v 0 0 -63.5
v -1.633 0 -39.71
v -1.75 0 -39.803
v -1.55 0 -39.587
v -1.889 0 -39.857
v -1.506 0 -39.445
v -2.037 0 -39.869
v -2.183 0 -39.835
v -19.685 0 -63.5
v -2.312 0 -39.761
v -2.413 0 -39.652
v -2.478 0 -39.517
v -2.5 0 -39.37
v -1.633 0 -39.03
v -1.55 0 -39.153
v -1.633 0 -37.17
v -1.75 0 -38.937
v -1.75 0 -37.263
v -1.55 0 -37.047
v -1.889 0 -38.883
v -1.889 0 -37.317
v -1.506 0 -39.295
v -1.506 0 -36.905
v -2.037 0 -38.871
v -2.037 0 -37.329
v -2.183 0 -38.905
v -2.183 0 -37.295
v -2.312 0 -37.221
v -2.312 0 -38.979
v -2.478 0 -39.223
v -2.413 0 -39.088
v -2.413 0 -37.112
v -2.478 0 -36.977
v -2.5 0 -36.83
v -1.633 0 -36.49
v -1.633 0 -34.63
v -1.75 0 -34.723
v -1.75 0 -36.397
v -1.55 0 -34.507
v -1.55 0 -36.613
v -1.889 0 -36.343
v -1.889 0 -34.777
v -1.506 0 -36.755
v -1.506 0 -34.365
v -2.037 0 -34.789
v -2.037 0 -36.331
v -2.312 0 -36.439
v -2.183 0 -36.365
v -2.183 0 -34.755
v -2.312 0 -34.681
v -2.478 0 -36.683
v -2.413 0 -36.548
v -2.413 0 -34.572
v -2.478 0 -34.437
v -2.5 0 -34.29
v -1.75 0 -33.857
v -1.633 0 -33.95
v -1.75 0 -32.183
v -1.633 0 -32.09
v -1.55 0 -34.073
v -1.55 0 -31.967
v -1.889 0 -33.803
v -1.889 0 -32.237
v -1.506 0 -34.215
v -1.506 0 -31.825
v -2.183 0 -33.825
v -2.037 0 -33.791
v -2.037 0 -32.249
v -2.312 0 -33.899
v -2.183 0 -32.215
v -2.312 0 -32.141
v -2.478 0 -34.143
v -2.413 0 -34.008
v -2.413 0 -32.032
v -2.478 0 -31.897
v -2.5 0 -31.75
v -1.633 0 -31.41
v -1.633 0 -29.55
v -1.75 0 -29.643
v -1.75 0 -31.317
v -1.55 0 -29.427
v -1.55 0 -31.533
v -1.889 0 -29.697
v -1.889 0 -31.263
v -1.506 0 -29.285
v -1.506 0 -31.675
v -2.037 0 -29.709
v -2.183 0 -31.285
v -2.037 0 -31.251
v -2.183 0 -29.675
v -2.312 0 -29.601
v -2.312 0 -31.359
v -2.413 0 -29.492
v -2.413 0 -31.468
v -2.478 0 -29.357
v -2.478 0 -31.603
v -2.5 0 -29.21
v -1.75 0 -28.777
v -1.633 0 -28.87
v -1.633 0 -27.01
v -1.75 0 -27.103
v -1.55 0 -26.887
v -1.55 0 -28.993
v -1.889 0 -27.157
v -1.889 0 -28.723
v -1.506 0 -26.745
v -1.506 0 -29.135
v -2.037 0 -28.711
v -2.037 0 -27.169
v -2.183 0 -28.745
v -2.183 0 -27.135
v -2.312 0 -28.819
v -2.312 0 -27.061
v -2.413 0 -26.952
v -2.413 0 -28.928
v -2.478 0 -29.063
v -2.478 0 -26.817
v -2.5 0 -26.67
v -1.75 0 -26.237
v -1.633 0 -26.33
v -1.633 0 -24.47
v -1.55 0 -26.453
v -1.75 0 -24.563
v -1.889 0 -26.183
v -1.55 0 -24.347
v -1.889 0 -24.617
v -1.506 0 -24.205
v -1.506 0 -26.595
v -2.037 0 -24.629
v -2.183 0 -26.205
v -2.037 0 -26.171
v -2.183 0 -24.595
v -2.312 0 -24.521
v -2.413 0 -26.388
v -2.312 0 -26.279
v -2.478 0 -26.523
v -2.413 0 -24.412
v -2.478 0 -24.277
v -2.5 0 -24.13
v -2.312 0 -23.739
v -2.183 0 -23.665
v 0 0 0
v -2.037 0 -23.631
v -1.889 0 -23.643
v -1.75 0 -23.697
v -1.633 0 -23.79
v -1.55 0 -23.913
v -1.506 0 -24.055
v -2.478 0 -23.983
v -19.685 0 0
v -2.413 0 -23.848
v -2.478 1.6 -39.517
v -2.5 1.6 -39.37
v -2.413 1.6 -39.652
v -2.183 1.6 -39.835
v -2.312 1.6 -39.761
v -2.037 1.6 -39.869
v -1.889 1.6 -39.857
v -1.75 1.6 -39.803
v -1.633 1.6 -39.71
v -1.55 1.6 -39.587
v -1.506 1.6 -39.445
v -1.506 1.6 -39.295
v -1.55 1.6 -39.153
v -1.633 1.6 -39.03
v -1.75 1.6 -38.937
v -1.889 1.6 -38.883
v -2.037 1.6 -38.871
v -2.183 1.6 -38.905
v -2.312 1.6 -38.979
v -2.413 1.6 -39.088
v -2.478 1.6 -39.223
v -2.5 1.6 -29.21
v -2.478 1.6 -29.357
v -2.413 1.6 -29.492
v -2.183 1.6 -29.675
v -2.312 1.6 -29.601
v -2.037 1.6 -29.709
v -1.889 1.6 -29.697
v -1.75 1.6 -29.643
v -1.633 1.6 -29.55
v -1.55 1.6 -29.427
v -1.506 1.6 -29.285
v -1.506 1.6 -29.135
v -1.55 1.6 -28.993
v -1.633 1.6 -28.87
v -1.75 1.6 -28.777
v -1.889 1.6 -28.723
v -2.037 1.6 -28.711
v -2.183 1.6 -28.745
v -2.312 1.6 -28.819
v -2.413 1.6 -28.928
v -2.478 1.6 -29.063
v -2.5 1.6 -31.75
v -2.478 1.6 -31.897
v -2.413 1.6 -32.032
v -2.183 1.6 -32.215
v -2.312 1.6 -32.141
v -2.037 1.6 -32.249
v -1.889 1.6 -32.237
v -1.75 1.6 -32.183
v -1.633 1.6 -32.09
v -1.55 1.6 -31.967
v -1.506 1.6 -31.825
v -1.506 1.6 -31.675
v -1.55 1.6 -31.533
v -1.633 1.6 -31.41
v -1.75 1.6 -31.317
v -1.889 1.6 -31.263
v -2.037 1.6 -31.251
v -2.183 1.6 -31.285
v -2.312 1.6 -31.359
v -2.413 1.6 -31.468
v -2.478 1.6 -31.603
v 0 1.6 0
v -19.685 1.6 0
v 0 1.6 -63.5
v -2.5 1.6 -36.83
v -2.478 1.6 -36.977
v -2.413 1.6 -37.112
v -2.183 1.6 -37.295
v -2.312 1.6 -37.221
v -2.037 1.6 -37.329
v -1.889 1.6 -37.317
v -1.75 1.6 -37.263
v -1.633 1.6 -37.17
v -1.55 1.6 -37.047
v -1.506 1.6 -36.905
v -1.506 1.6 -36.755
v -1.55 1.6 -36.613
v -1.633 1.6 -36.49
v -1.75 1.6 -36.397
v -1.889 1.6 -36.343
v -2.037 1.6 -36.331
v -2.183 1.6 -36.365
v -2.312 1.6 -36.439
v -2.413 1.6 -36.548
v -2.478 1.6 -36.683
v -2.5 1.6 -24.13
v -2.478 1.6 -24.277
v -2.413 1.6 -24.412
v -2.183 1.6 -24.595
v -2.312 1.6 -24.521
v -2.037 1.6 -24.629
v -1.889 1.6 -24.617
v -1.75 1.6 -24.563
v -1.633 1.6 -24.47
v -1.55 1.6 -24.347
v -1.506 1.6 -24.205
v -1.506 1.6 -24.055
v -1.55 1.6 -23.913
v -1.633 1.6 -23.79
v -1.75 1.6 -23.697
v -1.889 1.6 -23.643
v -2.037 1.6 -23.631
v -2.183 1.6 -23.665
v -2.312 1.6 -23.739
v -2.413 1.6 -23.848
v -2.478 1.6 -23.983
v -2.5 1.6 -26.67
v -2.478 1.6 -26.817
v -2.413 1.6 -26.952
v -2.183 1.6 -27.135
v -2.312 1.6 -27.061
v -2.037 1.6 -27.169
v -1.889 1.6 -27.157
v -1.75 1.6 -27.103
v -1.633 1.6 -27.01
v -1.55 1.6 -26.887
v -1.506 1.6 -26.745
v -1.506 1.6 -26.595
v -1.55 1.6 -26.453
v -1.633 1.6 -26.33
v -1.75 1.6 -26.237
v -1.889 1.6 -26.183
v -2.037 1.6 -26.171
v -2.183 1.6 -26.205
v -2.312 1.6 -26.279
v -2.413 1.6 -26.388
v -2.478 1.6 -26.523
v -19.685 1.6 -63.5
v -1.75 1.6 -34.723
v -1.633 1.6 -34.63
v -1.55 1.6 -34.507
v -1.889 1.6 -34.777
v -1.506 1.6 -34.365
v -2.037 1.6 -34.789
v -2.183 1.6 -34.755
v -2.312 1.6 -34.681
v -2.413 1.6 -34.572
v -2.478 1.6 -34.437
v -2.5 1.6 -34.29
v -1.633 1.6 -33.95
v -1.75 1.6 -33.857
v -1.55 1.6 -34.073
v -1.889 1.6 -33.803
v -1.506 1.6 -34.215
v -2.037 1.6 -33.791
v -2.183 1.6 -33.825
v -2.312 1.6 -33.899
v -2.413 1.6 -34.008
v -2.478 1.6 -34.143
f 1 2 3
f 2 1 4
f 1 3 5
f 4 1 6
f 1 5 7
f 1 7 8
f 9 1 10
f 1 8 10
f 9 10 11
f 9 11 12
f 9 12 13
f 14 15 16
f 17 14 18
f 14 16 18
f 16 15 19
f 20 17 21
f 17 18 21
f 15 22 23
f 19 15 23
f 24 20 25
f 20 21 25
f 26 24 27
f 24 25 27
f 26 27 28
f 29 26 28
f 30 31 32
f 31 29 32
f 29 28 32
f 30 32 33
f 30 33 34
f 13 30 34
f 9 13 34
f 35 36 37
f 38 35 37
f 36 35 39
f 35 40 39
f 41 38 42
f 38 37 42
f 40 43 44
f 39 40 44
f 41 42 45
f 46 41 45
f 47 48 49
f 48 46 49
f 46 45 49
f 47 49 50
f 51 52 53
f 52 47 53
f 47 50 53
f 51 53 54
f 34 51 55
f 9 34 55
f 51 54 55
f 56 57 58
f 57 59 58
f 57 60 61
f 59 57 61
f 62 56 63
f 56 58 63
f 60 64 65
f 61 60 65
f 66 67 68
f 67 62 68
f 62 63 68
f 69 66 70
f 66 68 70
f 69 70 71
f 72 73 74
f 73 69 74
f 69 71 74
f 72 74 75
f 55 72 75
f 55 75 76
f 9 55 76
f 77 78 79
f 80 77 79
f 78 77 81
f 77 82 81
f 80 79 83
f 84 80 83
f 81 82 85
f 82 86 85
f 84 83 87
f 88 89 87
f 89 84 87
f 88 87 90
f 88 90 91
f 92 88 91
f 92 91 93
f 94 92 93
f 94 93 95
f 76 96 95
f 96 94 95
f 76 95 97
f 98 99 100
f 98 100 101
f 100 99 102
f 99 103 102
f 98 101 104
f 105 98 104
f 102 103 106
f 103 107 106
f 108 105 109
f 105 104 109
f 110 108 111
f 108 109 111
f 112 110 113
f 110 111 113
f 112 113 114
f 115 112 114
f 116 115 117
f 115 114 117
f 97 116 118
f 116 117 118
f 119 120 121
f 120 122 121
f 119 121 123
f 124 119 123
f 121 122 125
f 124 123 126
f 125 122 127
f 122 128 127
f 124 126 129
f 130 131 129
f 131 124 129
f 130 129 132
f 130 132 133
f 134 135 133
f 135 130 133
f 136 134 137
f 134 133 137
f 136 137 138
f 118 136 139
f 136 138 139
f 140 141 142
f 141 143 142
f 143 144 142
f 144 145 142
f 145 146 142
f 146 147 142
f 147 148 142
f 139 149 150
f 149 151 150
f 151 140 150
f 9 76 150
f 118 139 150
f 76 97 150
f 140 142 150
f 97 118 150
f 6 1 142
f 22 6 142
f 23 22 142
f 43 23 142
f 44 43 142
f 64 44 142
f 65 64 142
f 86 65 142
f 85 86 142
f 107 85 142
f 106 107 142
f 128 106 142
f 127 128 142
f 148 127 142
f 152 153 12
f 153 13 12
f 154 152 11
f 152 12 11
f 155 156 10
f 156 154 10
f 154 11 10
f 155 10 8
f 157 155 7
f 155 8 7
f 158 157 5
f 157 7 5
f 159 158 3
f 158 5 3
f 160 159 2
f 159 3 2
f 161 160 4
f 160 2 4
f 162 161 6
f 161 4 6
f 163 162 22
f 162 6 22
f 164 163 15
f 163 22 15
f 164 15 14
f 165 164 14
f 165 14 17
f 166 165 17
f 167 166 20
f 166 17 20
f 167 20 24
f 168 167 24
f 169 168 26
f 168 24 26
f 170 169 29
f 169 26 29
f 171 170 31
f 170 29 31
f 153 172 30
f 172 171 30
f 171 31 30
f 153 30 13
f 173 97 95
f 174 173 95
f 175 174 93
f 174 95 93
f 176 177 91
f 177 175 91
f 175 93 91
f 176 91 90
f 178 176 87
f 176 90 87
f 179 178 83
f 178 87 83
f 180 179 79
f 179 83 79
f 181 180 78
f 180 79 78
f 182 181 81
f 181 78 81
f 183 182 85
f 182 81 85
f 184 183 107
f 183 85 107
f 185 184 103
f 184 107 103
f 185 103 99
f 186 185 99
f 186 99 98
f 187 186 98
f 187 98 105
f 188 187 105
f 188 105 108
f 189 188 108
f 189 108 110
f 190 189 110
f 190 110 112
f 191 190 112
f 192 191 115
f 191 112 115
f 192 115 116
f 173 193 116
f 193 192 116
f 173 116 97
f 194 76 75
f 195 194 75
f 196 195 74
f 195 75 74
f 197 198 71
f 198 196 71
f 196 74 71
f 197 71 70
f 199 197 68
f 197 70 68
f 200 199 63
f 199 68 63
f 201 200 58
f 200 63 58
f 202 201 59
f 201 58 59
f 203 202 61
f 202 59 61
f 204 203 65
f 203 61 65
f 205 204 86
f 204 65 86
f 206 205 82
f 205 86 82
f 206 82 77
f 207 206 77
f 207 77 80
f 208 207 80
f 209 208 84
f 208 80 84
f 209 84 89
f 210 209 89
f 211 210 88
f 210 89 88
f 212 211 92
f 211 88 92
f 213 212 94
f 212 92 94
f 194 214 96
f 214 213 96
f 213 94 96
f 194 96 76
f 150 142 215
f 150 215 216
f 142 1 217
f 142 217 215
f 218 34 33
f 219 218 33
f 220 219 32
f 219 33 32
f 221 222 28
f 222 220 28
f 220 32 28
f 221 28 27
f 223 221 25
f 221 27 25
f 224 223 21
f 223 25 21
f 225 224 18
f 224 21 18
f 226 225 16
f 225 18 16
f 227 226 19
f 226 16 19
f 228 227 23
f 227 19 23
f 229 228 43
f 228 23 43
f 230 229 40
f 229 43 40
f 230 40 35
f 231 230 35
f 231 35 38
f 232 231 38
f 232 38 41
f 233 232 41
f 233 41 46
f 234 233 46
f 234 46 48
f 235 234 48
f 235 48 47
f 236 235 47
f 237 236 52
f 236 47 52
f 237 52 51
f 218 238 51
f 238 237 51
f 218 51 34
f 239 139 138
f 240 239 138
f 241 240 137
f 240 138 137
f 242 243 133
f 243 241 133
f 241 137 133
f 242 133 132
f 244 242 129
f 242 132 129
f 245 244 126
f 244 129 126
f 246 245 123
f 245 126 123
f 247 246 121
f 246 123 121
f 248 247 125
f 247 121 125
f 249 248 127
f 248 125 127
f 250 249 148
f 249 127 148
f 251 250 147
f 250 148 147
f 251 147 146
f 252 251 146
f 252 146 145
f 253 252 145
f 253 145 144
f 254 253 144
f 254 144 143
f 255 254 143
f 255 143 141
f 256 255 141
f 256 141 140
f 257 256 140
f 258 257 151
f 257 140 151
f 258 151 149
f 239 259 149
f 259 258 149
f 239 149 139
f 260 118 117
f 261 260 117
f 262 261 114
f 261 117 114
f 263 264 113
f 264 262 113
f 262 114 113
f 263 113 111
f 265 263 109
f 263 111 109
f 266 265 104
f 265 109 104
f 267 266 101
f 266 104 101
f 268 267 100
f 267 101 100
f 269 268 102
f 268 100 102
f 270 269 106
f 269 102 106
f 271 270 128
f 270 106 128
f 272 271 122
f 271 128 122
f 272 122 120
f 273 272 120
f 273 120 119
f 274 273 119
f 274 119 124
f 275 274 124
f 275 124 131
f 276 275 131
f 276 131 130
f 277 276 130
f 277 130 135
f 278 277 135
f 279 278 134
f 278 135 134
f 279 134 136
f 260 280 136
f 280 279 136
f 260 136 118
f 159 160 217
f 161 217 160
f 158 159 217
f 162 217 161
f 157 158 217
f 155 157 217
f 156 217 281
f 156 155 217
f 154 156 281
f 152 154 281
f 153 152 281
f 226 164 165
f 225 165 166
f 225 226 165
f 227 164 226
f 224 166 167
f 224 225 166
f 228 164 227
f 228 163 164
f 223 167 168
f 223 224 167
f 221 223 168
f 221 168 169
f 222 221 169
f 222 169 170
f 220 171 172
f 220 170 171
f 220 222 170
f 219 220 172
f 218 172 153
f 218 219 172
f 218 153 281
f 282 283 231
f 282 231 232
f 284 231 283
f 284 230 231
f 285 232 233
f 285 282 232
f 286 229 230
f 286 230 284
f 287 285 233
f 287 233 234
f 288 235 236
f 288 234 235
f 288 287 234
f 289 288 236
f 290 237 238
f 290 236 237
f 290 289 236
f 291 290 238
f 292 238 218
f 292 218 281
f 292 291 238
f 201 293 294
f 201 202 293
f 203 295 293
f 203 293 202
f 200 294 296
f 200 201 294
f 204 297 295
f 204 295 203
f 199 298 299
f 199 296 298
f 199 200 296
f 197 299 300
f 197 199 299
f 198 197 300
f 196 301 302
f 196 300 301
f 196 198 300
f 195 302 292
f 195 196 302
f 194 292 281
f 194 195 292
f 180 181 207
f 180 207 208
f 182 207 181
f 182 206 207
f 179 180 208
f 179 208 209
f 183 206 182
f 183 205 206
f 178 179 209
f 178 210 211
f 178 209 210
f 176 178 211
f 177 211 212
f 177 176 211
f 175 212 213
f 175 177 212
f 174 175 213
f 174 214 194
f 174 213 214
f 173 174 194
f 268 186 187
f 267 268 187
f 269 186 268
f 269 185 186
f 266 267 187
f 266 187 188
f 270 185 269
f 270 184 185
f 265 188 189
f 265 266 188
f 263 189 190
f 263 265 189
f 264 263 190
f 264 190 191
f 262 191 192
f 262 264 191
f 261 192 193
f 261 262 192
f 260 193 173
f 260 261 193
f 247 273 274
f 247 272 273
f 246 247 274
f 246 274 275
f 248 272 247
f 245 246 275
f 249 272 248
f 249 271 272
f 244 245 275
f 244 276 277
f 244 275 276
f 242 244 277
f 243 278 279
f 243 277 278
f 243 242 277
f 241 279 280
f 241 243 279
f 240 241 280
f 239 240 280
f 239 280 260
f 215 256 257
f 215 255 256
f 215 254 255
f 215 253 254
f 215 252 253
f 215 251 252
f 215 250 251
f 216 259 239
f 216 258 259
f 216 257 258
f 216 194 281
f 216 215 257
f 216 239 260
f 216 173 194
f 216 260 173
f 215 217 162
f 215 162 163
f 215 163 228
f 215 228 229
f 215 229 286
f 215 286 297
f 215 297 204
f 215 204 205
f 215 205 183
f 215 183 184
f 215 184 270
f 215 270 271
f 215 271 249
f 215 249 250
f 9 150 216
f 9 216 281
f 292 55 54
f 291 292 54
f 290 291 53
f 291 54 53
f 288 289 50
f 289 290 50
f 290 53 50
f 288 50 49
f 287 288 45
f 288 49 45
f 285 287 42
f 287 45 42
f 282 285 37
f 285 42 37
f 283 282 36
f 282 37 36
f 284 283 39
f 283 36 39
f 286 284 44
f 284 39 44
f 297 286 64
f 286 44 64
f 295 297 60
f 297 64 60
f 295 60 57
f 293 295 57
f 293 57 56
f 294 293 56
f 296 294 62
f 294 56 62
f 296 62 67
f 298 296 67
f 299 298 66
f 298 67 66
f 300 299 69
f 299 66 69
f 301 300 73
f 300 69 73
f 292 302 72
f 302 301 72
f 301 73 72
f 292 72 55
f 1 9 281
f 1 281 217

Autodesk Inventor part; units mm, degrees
ref_plane "YZ Plane" through (0, 0, 0) normal (1, 0, 0) x (0, 1, 0)
ref_plane "XZ Plane" through (0, 0, 0) normal (0, 1, 0) x (-1, 0, 0)
ref_plane "XY Plane" through (0, 0, 0) normal (0, 0, 1) x (1, 0, 0)
sketch "Sketch1" plane through (0, 0, 0) normal (0, 1, 0) x (-1, 0, 0)
  line L0 (0, 0) -> (19.685, 0)
  line L1 (19.685, 0) -> (19.685, -63.5)
  line L2 (19.685, -63.5) -> (0, -63.5)
  line L3 (0, -63.5) -> (0, 0)
  circle A0 centre (2, -24.13) radius 0.5
  circle A1 centre (2, -26.67) radius 0.5
  circle A2 centre (2, -29.21) radius 0.5
  circle A3 centre (2, -31.75) radius 0.5
  circle A4 centre (2, -34.29) radius 0.5
  circle A5 centre (2, -36.83) radius 0.5
  circle A6 centre (2, -39.37) radius 0.5
  dimension "d0" = 19.685
  dimension "d1" = 63.5
  dimension "d4" = 1
  dimension "d5" = 1
  dimension "d6" = 1
  dimension "d7" = 1
  dimension "d8" = 1
  dimension "d9" = 1
  dimension "d10" = 2.54
  dimension "d11" = 2.54
  dimension "d12" = 2.54
  dimension "d13" = 2.54
  dimension "d14" = 2.54
  dimension "d19" = 2
  dimension "d20" = 1
  dimension "d21" = 2.54
  dimension "d22" = 31.75
extrude "Extrusion3" add sketch "Sketch1" along normal blind 1.6
sketch "Sketch2" plane through (0, 0, 0) normal (0, -1, 0) x (1, 0, 0)
  circle A0 centre (-2, -24.13) radius 0.5 projected
sketch "Sketch3" plane through (0, 0, 0) normal (0, -1, 0) x (1, 0, 0)
  circle A0 centre (-2, -26.67) radius 0.5 projected
sketch "Sketch4" plane through (0, 0, 0) normal (0, -1, 0) x (1, 0, 0)
  circle A0 centre (-2, -29.21) radius 0.5 projected
sketch "Sketch5" plane through (0, 0, 0) normal (0, -1, 0) x (1, 0, 0)
  circle A0 centre (-2, -31.75) radius 0.5 projected
sketch "Sketch6" plane through (0, 0, 0) normal (0, -1, 0) x (1, 0, 0)
  circle A0 centre (-2, -34.29) radius 0.5 projected
sketch "Sketch7" plane through (0, 0, 0) normal (0, -1, 0) x (1, 0, 0)
  circle A0 centre (-2, -36.83) radius 0.5 projected
sketch "Sketch8" plane through (0, 0, 0) normal (0, -1, 0) x (1, 0, 0)
  circle A0 centre (-2, -39.37) radius 0.5 projected
properties part number "pcb"
